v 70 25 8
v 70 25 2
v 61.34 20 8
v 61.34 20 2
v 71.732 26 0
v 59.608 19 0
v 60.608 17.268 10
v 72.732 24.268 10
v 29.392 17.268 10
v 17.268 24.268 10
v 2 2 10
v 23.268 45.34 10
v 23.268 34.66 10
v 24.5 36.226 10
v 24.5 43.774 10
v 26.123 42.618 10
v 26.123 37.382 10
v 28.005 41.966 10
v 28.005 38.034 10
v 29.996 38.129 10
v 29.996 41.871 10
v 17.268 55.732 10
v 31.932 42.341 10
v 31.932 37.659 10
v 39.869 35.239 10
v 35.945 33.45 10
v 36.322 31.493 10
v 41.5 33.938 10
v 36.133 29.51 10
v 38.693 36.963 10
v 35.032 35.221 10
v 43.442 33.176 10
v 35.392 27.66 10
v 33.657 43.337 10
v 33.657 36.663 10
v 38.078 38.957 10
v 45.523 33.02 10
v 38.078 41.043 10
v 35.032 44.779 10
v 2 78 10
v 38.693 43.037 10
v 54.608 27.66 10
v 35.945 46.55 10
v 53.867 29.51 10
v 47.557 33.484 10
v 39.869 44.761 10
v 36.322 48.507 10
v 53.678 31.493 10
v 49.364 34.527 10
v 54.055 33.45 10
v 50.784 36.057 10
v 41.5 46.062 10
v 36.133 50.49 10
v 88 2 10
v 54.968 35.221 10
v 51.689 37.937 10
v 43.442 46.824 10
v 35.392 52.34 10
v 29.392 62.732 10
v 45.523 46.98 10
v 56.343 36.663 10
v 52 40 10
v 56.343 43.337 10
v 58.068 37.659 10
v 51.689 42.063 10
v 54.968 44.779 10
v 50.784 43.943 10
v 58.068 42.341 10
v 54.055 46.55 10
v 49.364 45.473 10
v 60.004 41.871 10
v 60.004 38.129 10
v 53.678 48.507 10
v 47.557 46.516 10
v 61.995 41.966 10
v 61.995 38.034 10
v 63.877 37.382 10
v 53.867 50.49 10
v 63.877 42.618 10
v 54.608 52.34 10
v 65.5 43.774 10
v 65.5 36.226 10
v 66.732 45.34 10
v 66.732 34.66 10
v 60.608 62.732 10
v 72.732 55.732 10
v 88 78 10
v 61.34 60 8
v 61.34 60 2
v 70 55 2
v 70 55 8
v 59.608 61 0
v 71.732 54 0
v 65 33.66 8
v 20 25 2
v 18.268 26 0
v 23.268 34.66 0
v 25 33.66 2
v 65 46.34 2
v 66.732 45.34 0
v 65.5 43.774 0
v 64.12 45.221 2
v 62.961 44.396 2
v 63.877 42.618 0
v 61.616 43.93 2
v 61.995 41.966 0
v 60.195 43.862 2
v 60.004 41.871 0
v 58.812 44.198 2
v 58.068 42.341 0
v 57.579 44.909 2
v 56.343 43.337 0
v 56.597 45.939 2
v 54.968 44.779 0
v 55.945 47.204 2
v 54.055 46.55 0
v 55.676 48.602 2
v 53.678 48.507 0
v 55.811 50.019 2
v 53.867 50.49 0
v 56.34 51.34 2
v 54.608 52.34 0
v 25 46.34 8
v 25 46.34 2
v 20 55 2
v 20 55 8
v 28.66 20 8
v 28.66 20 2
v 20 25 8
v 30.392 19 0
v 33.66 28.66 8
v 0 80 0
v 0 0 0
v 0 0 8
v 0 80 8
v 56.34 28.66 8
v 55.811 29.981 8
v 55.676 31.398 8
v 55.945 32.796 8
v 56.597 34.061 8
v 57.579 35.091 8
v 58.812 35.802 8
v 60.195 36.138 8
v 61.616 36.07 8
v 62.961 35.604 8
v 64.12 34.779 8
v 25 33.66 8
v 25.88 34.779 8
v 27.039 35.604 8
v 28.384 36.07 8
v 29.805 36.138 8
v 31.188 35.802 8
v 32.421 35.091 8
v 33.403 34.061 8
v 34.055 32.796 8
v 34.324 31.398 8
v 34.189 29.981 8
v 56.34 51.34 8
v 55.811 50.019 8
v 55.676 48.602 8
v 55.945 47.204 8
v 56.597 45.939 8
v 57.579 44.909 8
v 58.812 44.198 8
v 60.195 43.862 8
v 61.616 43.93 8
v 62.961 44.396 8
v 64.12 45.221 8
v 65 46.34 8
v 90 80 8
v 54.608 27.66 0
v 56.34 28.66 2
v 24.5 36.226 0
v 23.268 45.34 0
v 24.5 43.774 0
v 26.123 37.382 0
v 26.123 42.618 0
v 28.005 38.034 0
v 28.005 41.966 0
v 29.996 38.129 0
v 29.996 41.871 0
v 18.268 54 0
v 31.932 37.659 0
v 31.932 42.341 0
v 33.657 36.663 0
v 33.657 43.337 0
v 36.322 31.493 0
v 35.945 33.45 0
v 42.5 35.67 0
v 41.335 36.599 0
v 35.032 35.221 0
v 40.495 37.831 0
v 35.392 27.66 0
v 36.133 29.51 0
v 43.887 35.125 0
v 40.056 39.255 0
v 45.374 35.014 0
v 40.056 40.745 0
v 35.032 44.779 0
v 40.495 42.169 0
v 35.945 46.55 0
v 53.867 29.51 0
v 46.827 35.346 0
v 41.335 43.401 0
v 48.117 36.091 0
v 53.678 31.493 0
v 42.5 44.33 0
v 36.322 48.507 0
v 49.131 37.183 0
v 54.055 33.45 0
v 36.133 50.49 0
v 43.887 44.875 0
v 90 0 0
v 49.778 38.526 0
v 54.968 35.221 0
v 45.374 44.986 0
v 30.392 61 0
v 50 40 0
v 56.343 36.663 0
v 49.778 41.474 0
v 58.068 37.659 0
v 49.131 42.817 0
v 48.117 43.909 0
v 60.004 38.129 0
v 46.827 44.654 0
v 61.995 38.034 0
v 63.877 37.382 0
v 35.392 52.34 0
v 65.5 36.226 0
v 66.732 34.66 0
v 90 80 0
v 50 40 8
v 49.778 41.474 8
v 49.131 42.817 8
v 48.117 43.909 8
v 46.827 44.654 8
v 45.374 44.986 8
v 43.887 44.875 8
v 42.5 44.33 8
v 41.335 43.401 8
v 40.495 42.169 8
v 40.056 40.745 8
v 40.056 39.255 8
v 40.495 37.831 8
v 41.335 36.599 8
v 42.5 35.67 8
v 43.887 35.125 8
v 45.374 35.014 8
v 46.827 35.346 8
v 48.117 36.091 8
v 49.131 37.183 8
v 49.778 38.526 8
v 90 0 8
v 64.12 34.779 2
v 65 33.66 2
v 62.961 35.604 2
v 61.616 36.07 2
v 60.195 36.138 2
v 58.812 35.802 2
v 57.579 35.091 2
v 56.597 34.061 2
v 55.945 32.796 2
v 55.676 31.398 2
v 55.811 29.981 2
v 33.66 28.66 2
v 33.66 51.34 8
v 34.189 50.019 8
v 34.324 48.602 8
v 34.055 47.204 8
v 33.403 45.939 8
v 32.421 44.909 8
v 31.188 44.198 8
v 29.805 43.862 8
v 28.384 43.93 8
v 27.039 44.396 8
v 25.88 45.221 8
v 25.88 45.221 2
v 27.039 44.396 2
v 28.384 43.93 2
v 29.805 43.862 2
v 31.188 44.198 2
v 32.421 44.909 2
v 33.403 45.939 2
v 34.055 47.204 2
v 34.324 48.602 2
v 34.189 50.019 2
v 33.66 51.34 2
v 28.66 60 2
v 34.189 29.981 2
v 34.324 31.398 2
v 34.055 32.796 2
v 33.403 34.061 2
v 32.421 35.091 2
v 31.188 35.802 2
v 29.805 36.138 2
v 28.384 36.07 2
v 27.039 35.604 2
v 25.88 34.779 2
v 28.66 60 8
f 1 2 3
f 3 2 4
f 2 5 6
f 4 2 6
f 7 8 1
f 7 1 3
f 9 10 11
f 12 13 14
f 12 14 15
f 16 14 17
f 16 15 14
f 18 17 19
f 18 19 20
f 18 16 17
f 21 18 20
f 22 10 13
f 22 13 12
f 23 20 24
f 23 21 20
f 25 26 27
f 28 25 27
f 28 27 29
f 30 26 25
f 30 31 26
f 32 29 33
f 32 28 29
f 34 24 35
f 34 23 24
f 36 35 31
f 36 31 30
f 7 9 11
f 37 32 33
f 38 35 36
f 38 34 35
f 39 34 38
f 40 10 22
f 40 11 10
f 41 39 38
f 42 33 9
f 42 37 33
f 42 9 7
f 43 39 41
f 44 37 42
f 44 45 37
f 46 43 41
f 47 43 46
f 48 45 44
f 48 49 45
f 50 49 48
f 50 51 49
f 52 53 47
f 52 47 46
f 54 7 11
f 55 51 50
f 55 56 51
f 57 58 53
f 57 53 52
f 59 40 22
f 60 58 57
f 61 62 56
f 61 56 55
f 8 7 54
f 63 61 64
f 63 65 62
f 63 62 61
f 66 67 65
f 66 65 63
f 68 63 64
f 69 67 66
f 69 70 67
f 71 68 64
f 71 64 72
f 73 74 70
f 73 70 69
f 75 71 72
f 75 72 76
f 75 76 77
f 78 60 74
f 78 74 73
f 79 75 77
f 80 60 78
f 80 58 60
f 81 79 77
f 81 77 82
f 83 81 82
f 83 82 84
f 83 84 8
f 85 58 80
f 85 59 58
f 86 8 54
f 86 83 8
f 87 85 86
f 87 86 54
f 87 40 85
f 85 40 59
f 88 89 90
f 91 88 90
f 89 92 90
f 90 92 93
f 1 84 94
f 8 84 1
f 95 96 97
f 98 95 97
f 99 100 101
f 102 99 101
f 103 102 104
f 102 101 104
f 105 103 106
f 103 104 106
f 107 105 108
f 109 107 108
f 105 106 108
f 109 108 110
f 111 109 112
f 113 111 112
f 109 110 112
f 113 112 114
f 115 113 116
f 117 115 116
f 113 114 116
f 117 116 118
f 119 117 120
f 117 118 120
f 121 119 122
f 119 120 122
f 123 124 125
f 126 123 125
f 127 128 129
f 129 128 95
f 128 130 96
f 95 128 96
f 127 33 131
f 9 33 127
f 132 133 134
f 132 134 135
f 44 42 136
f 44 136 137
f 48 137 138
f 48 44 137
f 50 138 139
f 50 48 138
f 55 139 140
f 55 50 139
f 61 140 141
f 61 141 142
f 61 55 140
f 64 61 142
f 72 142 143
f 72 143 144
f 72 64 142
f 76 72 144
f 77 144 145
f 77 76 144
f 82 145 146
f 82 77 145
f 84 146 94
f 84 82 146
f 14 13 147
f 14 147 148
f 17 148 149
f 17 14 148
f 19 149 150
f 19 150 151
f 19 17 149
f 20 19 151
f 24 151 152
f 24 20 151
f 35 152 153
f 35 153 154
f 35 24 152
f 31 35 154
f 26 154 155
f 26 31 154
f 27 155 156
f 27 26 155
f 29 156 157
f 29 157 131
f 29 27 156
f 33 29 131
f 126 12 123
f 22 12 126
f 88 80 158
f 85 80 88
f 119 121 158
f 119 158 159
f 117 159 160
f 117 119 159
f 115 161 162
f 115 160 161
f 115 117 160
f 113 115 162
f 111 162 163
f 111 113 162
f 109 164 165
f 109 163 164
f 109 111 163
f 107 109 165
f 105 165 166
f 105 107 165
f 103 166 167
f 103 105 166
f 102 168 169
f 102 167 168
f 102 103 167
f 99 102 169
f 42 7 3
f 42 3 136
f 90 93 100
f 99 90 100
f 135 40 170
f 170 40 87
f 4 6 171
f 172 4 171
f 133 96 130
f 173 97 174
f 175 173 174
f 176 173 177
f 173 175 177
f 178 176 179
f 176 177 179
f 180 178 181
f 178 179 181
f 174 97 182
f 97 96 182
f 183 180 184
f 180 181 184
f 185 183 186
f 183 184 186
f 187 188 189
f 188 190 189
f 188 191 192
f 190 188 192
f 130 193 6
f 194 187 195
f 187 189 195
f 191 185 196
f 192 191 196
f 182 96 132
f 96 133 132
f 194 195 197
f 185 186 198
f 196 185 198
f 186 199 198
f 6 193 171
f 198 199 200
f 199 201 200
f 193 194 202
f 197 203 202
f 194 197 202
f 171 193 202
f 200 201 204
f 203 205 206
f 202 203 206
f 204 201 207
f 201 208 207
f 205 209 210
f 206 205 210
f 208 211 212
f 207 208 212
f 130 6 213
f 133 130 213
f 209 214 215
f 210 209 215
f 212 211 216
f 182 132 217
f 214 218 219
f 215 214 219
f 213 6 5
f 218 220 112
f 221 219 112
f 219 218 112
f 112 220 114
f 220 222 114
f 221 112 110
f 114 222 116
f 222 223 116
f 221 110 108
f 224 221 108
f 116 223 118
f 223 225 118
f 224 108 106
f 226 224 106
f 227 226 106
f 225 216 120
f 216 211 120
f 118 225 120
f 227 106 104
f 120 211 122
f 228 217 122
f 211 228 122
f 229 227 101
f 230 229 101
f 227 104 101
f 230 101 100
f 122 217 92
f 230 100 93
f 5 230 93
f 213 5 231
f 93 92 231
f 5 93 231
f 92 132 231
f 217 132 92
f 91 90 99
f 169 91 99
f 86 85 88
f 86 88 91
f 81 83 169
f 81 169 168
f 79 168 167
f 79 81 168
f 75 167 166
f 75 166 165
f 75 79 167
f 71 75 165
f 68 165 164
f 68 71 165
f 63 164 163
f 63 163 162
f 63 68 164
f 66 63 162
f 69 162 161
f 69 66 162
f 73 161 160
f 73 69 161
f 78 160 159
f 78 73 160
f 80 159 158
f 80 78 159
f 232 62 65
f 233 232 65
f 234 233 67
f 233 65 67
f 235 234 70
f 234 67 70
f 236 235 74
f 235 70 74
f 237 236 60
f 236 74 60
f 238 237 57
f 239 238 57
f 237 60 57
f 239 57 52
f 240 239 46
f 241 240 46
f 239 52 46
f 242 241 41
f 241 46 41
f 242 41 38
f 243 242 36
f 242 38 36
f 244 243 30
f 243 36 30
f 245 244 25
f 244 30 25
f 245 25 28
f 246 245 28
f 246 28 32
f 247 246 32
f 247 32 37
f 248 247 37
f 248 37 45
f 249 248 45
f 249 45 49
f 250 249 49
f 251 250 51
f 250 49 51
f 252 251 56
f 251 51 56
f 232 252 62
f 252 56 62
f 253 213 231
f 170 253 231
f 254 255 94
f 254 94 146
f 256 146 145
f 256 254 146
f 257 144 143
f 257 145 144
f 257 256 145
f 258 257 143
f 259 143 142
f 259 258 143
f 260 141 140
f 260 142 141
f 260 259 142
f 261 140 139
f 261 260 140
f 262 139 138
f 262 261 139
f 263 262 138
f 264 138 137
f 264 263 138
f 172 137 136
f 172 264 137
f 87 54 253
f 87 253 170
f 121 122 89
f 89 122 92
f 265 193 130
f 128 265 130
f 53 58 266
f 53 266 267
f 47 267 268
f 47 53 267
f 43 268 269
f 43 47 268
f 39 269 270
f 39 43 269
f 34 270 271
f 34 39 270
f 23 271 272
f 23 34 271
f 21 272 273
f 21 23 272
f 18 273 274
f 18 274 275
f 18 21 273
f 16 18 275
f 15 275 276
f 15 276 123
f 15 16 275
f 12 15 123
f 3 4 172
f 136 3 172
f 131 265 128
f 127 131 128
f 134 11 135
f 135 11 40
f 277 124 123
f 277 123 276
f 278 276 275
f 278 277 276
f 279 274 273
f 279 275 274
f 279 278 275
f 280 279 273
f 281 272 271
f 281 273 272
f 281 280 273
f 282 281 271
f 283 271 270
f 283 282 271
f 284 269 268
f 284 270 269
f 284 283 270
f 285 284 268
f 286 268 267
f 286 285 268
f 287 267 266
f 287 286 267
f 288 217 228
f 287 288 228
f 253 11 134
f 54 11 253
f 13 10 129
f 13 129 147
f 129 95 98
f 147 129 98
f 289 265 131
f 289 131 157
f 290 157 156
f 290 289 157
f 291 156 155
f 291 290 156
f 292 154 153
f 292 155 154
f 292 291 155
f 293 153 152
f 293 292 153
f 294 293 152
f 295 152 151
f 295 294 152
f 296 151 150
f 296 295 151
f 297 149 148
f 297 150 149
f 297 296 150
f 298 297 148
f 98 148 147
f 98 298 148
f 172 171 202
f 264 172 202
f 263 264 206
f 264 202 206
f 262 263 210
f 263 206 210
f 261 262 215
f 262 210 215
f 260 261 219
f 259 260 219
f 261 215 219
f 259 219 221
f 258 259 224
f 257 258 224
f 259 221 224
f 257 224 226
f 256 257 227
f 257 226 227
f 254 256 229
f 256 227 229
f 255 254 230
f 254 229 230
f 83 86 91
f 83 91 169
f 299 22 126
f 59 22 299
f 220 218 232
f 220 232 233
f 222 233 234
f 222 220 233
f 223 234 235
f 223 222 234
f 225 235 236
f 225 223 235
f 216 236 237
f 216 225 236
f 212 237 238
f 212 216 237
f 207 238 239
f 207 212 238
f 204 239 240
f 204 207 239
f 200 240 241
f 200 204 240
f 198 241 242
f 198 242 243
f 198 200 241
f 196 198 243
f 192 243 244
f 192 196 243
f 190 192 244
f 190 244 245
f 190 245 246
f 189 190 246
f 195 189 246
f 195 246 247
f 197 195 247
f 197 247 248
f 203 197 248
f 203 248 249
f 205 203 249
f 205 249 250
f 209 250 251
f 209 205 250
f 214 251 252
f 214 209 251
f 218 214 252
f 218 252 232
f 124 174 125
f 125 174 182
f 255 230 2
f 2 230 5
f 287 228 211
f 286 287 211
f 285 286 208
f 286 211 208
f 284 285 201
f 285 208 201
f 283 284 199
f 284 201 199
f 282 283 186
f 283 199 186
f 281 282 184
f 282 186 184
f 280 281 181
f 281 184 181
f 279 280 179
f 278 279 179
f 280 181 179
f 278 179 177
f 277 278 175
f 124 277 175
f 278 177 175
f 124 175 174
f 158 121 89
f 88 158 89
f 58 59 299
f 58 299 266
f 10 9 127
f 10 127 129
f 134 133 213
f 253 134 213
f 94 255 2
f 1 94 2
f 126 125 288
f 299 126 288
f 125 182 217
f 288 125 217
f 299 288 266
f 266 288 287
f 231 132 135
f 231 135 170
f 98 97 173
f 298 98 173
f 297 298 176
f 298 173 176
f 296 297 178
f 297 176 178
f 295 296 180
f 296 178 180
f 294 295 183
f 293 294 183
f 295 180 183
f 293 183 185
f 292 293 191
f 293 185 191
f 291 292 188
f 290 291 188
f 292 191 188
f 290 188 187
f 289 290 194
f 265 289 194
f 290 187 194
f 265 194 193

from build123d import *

# Parameters (mm, degrees)
SKETCH_W      = 90
SKETCH_H      = 80
SKETCH_R      = 5
EXTRUDE_DEPTH = 10
CHAMFER_SIZE  = 2


with BuildPart() as part:
    # Sketch → Extrude (new body)
    with BuildSketch(Plane.XY):
        with Locations((45, 40)):
            Rectangle(SKETCH_W, SKETCH_H)
        with Locations((45, 40)):
            Circle(SKETCH_R, mode=Mode.SUBTRACT)
        with BuildLine():
            Line((28.660254, 60), (33.660254, 51.339746))
            ThreePointArc((25, 46.339746), (31.830127, 44.509619), (33.660254, 51.339746))
            Line((25, 46.339746), (20, 55))
            Line((20, 55), (28.660254, 60))
        make_face(mode=Mode.SUBTRACT)
        with BuildLine():
            Line((56.339746, 51.339746), (61.339746, 60))
            Line((61.339746, 60), (70, 55))
            Line((70, 55), (65, 46.339746))
            ThreePointArc((56.339746, 51.339746), (58.169873, 44.509619), (65, 46.339746))
        make_face(mode=Mode.SUBTRACT)
        with BuildLine():
            Line((65, 33.660254), (70, 25))
            Line((70, 25), (61.339746, 20))
            Line((61.339746, 20), (56.339746, 28.660254))
            ThreePointArc((65, 33.660254), (58.169873, 35.490381), (56.339746, 28.660254))
        make_face(mode=Mode.SUBTRACT)
        with BuildLine():
            Line((20, 25), (25, 33.660254))
            ThreePointArc((33.660254, 28.660254), (31.830127, 35.490381), (25, 33.660254))
            Line((33.660254, 28.660254), (28.660254, 20))
            Line((28.660254, 20), (20, 25))
        make_face(mode=Mode.SUBTRACT)
    extrude(amount=EXTRUDE_DEPTH)

    # Chamfer
    chamfer_edges = [part.edges().sort_by_distance(p)[0] for p in [
        (45, 0, 10),
        (90, 40, 10),
        (45, 80, 10),
        (0, 40, 10),
        (31.160254, 24.330127, 0),
        (24.330127, 22.5, 10),
        (22.5, 29.330127, 10),
        (65, 33.660254, 5),
        (67.5, 29.330127, 0),
        (65.669873, 22.5, 10),
        (58.839746, 24.330127, 10),
        (56.339746, 51.339746, 5),
        (58.839746, 55.669873, 0),
        (65.669873, 57.5, 10),
        (67.5, 50.669873, 10),
        (25, 46.339746, 5),
        (22.5, 50.669873, 0),
        (24.330127, 57.5, 10),
        (31.160254, 55.669873, 10),
        (50, 40, 5),
        (40, 40, 10),
    ]]
    chamfer(chamfer_edges, length=CHAMFER_SIZE)


solid = part.part
